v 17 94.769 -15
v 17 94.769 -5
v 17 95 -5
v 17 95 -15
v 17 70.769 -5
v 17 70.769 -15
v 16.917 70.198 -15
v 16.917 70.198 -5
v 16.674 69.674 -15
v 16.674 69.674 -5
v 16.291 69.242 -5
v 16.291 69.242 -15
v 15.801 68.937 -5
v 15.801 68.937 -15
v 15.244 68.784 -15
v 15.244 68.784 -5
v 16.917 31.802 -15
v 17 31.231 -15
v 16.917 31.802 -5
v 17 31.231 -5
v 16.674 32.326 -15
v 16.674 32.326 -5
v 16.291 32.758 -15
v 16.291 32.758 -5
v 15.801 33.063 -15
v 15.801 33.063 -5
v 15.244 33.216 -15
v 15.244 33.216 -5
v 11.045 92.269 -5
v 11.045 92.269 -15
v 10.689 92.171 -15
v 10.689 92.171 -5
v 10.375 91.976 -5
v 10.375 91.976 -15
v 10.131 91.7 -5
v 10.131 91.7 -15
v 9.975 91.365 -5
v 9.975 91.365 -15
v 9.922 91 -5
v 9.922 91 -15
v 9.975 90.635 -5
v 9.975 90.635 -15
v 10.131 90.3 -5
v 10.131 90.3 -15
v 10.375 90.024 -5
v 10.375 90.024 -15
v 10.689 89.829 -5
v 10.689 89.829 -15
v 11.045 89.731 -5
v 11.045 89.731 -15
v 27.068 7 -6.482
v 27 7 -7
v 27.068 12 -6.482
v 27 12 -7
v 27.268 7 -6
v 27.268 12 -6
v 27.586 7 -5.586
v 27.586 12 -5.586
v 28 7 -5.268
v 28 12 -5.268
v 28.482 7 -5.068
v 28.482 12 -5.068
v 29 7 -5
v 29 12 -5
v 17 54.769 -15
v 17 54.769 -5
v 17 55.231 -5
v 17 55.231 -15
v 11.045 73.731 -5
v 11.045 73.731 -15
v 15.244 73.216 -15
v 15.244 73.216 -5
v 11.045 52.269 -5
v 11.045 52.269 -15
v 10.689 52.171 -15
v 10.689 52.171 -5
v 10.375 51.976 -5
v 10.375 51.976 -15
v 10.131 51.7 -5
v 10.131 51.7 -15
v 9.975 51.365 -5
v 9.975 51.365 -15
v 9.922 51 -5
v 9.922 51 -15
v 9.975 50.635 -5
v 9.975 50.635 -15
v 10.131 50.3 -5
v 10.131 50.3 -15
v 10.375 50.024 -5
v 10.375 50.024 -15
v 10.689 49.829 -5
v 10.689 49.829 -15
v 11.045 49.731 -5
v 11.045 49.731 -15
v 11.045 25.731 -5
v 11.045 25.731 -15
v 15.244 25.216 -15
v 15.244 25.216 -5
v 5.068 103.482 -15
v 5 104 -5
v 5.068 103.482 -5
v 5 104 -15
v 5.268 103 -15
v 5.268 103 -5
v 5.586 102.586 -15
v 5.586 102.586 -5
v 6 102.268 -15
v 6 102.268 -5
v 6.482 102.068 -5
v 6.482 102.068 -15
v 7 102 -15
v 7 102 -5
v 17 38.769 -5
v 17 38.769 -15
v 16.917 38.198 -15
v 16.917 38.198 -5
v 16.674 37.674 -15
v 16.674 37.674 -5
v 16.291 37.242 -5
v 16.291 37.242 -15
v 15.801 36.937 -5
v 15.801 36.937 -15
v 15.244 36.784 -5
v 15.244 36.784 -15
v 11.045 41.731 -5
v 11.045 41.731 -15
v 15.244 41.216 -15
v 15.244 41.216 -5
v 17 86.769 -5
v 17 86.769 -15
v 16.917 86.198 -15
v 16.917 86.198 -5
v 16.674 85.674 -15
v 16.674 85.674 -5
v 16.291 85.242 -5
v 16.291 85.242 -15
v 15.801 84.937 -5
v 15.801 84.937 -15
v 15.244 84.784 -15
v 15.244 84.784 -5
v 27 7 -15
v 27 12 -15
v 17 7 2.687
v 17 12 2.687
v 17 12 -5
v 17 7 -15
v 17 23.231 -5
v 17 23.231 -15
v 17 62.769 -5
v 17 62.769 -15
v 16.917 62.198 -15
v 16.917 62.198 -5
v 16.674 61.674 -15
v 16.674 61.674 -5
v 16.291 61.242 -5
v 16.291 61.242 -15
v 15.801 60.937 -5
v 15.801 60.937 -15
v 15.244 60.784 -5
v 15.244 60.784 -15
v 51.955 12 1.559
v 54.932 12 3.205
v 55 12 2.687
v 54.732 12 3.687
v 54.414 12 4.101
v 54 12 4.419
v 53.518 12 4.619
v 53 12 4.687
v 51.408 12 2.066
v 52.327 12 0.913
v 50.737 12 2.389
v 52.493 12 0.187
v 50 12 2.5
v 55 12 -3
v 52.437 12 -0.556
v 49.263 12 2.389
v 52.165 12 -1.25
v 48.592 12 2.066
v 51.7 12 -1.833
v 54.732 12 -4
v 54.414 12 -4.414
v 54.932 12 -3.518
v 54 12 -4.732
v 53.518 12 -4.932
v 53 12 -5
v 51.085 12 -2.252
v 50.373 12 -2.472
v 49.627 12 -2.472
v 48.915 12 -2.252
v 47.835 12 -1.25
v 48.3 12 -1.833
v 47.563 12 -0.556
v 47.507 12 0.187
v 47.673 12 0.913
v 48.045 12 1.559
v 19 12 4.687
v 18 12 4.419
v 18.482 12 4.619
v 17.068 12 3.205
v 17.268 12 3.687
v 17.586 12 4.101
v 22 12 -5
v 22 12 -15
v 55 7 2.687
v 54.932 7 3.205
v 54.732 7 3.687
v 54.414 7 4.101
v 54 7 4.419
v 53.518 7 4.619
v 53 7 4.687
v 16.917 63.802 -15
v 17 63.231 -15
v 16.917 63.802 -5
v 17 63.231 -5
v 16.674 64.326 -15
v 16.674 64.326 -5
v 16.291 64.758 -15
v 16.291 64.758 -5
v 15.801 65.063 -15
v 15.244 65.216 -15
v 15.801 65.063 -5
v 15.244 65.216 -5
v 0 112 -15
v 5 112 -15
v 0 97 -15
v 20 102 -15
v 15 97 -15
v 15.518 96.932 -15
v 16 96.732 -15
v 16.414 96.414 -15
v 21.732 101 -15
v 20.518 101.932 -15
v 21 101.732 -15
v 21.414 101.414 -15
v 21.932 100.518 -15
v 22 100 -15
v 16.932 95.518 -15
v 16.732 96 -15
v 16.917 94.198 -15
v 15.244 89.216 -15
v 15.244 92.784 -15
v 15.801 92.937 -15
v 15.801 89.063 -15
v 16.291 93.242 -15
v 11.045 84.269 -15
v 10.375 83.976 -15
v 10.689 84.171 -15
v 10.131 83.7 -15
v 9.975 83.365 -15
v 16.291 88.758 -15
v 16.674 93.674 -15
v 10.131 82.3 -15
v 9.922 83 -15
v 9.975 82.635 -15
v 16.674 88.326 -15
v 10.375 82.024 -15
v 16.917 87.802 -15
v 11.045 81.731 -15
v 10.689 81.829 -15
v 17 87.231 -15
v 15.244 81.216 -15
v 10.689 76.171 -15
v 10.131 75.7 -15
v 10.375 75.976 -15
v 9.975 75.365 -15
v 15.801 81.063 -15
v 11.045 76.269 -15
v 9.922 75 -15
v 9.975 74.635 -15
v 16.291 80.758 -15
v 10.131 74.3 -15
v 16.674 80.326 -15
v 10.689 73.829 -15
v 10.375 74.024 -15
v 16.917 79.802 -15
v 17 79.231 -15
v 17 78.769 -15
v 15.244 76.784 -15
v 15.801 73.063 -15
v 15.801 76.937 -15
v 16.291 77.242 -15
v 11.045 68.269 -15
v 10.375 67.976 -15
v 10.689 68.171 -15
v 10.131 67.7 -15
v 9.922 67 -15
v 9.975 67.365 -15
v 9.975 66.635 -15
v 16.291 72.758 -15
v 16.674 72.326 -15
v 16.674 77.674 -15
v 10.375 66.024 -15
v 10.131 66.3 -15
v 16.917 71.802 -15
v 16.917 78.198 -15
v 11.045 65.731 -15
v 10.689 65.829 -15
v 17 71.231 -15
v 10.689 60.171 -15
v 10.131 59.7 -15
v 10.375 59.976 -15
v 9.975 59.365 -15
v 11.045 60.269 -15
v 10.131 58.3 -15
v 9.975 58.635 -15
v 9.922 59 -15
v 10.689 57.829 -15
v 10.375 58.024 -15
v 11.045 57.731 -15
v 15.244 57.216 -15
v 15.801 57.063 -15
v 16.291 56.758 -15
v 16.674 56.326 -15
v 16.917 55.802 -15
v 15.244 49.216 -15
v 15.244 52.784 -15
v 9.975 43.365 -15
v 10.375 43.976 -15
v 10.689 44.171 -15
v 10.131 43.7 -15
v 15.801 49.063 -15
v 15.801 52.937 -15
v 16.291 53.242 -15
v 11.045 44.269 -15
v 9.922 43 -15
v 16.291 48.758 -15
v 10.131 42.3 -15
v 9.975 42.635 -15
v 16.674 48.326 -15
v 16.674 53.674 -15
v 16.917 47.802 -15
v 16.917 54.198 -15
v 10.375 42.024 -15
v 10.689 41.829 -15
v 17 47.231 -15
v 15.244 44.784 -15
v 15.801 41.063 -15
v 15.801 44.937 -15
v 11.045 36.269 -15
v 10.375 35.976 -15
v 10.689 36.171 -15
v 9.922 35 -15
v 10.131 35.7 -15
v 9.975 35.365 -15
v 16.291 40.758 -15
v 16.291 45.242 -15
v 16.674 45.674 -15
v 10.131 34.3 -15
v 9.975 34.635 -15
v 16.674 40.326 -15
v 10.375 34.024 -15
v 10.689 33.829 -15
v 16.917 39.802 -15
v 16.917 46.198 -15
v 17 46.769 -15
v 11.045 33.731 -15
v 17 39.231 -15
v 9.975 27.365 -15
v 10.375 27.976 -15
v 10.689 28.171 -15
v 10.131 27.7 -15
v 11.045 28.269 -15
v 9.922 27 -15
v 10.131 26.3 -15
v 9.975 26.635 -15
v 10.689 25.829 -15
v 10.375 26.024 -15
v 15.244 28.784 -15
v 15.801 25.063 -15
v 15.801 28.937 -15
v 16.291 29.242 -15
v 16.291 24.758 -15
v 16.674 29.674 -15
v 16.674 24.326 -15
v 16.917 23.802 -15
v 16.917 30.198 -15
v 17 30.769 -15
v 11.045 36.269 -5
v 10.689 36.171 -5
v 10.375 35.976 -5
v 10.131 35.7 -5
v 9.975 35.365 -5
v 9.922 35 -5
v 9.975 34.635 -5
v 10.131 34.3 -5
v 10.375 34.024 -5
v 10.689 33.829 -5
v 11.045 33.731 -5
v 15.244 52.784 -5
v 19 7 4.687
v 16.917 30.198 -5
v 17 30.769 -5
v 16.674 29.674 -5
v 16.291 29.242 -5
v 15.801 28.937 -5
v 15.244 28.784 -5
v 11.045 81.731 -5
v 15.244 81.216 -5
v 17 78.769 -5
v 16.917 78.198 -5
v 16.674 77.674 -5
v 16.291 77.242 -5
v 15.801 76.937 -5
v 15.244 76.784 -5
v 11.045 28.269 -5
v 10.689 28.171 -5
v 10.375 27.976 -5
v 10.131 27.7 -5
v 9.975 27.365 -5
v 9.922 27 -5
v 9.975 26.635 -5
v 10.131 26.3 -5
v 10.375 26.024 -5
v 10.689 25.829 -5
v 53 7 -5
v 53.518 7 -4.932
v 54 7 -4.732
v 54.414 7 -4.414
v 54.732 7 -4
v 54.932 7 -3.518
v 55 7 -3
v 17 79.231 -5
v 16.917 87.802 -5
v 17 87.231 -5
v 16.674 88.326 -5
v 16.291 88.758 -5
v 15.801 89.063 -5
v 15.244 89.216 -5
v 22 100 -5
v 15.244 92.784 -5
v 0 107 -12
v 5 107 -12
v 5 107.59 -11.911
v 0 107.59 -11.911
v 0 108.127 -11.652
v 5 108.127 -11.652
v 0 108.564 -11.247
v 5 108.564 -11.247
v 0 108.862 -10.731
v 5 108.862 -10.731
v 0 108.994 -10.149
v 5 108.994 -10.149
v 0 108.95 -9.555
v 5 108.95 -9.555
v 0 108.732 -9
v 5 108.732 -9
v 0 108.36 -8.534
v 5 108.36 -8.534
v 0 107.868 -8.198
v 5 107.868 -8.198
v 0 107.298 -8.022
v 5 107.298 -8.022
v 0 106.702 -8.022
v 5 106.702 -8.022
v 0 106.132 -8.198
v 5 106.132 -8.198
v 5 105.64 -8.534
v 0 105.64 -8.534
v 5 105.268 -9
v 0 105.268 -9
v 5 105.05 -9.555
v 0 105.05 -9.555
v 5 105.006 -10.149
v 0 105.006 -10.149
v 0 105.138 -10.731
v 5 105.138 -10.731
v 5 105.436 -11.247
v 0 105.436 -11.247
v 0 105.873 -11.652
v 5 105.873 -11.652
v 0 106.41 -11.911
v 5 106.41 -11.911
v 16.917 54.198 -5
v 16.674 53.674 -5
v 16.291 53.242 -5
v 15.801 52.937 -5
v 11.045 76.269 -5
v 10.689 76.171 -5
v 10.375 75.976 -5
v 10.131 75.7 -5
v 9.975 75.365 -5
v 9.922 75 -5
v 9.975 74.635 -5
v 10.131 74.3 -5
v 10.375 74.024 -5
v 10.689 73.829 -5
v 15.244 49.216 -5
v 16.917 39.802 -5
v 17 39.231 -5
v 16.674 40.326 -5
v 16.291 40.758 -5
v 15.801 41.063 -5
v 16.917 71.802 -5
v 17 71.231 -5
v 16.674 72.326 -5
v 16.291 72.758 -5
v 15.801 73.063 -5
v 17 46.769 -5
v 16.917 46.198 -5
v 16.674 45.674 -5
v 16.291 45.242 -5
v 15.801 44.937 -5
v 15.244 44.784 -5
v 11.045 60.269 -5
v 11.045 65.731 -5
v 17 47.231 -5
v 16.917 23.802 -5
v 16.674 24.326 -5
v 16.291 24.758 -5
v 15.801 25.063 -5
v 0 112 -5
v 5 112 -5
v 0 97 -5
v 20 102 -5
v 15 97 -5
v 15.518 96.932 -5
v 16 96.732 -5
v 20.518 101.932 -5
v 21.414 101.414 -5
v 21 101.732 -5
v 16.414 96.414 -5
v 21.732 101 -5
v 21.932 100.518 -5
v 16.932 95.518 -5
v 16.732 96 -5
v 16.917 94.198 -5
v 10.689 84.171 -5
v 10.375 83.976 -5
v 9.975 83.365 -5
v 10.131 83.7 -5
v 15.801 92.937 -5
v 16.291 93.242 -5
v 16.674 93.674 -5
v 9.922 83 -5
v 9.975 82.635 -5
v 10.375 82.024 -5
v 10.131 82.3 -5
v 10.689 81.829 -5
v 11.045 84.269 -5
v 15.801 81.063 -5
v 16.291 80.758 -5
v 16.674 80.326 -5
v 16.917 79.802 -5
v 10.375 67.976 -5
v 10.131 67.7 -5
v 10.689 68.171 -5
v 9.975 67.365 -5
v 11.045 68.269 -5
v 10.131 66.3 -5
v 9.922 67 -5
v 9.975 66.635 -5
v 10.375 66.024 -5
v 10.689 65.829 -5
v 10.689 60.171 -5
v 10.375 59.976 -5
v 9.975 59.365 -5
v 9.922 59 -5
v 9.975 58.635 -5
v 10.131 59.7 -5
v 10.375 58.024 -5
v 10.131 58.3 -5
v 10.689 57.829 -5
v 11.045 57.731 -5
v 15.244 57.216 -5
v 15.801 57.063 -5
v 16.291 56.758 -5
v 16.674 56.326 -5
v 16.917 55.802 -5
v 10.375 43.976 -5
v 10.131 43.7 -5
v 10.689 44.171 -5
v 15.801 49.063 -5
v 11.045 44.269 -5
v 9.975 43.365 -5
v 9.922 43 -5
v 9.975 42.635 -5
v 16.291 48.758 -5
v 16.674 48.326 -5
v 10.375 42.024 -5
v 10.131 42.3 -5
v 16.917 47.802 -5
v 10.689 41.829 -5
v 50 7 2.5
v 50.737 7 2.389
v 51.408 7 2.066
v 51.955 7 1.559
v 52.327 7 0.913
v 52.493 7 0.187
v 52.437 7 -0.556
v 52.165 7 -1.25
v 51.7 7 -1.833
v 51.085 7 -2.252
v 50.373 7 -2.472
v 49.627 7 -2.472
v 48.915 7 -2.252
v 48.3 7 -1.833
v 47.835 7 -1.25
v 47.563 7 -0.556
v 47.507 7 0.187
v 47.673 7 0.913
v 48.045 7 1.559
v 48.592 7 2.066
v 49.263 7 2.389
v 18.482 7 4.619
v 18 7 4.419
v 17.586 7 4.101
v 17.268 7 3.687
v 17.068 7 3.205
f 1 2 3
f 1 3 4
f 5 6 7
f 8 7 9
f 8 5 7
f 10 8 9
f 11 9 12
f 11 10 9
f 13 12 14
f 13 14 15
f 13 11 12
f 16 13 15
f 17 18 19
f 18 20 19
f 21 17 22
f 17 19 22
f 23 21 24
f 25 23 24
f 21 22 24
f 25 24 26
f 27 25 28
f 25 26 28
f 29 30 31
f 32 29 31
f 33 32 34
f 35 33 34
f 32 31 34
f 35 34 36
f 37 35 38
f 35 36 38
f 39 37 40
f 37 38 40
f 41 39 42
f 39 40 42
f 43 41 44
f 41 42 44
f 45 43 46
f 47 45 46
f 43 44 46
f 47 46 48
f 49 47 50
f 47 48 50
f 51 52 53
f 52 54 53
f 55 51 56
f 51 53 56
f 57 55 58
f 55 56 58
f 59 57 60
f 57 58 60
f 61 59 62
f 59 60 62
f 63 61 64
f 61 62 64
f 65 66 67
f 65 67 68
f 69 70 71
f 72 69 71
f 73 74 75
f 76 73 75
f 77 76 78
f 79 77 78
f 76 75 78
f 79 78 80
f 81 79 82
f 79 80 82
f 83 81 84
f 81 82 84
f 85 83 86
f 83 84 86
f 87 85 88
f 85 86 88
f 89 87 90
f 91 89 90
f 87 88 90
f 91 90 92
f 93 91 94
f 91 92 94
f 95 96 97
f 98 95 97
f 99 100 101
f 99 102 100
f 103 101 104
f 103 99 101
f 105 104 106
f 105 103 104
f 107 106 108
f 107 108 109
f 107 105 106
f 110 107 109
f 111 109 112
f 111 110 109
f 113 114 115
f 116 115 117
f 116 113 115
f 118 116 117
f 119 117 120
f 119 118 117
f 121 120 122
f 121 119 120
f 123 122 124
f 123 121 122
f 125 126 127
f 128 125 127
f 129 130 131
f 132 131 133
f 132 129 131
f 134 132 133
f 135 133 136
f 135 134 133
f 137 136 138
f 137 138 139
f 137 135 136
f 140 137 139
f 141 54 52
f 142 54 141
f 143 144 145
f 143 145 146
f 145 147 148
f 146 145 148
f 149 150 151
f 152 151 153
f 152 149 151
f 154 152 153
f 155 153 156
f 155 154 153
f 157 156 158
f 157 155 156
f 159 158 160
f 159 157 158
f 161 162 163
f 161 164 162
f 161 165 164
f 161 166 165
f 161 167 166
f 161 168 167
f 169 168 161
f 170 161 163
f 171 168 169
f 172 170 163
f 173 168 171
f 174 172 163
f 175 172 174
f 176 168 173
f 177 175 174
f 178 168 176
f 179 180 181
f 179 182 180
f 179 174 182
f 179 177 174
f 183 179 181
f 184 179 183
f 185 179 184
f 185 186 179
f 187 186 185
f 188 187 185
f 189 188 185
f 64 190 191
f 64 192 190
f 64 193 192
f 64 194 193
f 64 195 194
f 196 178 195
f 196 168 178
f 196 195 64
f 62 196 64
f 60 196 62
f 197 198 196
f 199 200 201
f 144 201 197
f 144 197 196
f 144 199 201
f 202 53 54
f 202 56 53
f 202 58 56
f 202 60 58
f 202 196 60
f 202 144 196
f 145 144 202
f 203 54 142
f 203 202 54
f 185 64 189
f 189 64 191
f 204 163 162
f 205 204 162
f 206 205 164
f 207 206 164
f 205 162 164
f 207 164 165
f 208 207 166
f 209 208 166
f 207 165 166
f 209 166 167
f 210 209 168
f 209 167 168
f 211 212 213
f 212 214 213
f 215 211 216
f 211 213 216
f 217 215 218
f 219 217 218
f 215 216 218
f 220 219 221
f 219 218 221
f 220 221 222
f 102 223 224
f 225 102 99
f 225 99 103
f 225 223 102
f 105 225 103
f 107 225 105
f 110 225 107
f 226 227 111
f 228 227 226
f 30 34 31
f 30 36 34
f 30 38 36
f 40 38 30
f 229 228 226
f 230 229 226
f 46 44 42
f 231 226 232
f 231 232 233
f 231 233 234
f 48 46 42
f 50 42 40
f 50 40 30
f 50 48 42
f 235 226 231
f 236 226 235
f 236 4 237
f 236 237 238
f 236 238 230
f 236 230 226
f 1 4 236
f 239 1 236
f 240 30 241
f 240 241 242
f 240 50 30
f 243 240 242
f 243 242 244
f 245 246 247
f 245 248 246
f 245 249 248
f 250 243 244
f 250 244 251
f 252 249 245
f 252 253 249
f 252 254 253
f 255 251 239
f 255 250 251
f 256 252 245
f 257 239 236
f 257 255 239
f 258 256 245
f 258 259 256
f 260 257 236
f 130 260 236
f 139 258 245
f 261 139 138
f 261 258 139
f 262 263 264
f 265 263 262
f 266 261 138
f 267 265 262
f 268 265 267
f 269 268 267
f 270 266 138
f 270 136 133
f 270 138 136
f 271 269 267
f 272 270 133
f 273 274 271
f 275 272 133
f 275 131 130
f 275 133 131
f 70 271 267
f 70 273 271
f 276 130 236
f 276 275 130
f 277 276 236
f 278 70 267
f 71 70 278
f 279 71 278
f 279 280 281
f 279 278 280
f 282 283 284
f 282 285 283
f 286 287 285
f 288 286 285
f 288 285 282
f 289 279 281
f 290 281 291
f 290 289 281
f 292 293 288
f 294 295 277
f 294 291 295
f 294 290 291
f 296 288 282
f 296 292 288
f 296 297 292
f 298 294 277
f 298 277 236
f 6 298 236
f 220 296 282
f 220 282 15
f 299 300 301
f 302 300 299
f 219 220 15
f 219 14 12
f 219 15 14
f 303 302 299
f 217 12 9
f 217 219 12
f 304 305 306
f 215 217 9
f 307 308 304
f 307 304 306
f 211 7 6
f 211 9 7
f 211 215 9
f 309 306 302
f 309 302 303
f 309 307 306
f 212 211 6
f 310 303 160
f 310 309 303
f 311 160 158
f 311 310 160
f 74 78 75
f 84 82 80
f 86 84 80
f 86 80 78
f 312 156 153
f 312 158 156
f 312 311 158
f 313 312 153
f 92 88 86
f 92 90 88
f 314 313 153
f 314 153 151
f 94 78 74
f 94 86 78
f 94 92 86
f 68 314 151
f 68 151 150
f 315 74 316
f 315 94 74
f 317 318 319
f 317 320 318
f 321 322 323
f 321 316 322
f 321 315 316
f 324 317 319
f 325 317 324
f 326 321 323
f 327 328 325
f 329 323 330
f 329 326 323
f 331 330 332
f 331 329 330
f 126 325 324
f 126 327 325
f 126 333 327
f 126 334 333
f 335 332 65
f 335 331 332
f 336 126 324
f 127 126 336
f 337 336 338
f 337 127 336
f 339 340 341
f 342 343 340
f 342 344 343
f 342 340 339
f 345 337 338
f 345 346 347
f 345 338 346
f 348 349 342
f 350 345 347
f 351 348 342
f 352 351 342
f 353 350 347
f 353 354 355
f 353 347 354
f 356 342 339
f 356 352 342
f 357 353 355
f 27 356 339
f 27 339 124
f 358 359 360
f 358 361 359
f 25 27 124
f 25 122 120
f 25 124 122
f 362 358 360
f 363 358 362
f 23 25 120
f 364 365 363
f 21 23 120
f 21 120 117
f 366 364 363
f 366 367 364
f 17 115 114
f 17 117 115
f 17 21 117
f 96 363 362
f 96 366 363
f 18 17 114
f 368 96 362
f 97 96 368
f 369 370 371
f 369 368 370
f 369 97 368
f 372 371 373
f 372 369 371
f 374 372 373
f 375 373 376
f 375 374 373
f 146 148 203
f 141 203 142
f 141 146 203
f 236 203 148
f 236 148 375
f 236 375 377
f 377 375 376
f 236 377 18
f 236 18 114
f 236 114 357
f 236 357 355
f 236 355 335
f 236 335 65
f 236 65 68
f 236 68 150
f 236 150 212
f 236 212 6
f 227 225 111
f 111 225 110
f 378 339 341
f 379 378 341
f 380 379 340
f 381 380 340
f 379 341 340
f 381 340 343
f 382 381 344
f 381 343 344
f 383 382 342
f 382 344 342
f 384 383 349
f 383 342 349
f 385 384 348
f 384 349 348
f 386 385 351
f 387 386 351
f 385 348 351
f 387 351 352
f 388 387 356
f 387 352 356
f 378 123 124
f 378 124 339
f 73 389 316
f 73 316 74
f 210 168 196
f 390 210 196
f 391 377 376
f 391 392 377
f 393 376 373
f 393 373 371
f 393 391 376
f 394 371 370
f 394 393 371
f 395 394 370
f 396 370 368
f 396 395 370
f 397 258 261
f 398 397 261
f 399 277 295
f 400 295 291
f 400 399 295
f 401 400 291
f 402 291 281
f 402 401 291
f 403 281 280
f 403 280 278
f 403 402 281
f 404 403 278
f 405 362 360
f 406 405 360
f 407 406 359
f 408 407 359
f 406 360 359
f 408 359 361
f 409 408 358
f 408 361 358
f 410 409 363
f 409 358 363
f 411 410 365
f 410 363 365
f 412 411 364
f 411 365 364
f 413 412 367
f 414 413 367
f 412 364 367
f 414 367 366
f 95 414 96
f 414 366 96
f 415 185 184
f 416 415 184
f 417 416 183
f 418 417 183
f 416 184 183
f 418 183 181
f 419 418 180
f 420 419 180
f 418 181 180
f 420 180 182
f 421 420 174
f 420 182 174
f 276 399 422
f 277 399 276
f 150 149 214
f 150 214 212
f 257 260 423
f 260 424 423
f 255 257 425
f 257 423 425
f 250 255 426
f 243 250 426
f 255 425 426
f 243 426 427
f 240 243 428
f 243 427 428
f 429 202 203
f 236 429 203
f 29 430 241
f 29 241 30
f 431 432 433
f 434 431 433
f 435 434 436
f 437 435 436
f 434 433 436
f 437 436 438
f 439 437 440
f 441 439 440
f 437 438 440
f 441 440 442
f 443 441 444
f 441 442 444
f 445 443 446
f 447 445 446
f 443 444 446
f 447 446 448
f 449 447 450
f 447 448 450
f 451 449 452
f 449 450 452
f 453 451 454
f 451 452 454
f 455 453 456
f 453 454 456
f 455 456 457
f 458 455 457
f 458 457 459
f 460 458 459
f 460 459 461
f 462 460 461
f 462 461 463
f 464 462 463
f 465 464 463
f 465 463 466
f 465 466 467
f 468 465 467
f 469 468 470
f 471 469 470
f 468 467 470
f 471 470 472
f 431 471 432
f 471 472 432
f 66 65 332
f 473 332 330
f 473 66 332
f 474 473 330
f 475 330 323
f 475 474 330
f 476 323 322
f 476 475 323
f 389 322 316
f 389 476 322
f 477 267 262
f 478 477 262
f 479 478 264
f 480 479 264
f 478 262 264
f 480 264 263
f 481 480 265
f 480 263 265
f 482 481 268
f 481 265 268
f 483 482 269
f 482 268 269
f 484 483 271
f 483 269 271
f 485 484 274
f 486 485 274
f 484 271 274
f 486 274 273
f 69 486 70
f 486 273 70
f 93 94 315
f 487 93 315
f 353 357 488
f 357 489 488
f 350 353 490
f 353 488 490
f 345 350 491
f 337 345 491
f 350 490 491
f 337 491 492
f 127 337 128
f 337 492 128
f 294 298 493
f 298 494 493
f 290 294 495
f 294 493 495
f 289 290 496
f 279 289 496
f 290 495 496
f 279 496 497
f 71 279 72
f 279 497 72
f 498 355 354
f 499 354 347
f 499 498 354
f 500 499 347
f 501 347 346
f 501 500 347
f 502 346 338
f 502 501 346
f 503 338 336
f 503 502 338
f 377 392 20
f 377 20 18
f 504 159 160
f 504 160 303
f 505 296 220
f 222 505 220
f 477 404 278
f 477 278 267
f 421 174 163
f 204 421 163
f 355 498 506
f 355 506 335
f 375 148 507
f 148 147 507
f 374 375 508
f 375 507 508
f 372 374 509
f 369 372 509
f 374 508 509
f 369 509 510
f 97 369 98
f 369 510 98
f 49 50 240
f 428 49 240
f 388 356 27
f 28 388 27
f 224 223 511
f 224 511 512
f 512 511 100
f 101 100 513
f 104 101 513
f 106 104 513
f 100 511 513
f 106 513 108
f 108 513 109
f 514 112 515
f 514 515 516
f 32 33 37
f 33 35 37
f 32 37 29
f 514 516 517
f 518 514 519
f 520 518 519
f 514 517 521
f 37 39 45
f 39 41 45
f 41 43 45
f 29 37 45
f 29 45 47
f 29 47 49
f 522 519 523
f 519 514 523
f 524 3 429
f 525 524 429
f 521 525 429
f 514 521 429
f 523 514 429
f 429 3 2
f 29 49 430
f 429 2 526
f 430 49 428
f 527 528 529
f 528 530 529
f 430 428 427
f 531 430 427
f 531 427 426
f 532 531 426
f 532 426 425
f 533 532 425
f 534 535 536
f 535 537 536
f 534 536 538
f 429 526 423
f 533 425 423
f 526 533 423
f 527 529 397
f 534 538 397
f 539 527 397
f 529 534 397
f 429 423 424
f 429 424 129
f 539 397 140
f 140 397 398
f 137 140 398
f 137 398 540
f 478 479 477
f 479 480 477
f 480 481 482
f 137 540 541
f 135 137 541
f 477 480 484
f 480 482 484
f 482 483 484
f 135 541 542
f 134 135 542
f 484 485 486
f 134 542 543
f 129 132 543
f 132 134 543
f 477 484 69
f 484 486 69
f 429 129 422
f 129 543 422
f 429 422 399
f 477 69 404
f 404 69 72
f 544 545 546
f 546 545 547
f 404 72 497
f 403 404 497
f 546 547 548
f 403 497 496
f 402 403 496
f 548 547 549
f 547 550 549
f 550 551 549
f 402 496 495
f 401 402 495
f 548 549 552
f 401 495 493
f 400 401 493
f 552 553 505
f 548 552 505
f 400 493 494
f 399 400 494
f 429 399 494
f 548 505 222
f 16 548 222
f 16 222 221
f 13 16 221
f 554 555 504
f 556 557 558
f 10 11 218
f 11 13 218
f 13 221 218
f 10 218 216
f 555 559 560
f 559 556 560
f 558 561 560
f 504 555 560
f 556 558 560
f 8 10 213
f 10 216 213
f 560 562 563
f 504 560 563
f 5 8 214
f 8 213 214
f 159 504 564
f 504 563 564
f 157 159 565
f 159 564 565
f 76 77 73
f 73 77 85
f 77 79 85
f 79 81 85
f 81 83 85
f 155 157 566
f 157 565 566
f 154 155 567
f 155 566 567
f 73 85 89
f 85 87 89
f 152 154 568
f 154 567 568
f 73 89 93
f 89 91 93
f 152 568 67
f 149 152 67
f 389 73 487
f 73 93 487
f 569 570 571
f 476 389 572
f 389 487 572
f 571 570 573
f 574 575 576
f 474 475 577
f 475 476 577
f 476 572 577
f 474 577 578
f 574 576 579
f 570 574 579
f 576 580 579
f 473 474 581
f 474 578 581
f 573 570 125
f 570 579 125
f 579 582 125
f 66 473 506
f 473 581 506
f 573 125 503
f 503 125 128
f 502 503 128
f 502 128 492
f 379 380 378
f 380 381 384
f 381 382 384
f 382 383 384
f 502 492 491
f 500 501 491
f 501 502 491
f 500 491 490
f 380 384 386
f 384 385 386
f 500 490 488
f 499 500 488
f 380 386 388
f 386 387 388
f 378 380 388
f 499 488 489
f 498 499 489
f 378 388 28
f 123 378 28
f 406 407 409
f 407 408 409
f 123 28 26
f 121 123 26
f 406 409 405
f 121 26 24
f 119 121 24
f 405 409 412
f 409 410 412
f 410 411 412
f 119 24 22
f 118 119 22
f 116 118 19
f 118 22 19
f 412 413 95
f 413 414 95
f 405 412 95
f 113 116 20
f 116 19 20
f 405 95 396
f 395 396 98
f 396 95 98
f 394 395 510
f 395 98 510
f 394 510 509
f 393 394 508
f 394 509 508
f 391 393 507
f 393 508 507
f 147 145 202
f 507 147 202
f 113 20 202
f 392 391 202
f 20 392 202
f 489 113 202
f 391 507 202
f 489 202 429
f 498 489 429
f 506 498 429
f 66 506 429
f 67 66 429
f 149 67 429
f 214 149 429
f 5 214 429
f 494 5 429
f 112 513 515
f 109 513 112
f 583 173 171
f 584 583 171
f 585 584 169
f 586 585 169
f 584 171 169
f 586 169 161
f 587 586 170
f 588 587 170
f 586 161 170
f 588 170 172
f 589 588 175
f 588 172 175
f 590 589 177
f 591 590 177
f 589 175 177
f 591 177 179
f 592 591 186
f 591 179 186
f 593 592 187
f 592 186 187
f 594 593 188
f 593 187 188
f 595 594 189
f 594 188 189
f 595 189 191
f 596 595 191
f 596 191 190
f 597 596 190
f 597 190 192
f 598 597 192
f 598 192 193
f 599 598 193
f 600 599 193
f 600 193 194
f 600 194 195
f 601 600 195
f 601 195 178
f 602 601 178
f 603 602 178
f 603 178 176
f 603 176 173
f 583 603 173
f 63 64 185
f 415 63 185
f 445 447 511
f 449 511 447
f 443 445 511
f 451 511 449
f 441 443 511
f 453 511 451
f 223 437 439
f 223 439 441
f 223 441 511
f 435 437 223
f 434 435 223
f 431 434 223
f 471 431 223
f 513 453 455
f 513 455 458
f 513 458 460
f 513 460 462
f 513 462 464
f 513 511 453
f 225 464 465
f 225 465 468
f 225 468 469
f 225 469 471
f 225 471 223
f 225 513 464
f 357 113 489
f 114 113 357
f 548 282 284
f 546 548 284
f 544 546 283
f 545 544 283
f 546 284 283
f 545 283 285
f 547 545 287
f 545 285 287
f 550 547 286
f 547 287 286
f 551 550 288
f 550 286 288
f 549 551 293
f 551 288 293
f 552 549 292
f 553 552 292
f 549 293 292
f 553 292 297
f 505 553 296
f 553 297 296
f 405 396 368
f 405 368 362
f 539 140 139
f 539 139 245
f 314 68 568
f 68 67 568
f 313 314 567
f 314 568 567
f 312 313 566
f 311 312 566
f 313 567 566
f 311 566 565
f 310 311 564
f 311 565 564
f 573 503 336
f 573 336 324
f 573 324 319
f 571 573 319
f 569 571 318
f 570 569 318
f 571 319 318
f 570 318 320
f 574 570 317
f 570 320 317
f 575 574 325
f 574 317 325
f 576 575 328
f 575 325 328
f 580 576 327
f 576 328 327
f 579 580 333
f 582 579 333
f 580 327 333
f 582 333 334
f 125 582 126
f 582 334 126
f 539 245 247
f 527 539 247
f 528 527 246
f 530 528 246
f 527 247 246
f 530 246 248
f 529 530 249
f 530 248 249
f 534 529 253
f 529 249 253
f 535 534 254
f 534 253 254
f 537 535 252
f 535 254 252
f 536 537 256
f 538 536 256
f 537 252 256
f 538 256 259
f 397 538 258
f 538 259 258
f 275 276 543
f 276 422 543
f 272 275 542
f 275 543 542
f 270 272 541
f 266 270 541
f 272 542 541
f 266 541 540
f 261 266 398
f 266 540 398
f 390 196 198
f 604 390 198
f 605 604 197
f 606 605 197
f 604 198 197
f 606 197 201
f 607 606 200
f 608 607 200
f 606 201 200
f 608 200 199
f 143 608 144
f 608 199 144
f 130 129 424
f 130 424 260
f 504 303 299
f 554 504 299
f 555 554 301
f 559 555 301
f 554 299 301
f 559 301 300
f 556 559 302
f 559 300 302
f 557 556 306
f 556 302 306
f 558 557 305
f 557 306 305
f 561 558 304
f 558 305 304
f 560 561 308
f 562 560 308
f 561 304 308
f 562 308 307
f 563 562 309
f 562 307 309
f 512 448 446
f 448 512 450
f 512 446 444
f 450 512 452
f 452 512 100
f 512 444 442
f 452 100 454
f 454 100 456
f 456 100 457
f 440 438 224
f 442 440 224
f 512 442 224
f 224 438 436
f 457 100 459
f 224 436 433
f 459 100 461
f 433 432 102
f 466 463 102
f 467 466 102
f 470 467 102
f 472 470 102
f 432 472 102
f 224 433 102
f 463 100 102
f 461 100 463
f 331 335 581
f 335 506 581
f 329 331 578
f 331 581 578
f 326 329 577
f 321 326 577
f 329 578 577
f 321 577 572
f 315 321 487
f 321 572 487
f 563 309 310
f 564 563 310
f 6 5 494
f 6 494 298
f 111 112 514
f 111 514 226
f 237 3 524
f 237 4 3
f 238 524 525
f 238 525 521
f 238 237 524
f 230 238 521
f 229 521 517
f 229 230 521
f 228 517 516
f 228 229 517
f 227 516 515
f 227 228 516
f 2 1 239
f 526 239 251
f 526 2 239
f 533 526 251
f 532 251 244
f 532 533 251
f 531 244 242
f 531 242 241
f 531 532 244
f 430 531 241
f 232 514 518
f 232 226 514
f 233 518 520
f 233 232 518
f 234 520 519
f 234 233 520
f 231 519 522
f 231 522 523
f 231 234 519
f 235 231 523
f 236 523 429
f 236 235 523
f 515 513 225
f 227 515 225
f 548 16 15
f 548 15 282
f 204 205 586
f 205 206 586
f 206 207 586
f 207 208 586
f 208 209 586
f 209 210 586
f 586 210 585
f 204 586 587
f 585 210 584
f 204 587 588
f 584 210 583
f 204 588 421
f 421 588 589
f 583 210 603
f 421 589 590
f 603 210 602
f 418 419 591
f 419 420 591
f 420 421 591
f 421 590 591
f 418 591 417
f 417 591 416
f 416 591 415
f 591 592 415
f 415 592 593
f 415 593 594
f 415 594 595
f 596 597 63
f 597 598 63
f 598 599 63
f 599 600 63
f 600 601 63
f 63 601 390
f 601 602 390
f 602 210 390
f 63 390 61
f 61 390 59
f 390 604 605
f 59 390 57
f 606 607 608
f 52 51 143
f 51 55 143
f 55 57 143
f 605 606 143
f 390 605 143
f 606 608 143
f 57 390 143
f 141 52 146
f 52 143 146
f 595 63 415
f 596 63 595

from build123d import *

# Parameters (mm, degrees)
BOSS_EXTRUDE1_DEPTH    = 7
SKETCH2_W              = 5
SKETCH2_H              = 10
BOSS_EXTRUDE2_DEPTH    = 95
SKETCH15_R             = 3.5
CUT_EXTRUDE3_DEPTH     = 7
SKETCH18_W             = 10
SKETCH18_H             = 5
BOSS_EXTRUDE3_DEPTH    = 34
BOSS_EXTRUDE4_DEPTH    = 10
FILLET1_R              = 2
FILLET2_R              = 2
LPATTERN2_COUNT        = 9
LPATTERN2_PITCH        = 8
FILLET1_OF_LPATTERN2_R = 2
SKETCH20_R             = 2.5
CUT_EXTRUDE4_DEPTH     = 10
CIRPATTERN2_COUNT      = 4
SKETCH22_W             = 135.679550384
SKETCH22_H             = 112.96527187
CUT_EXTRUDE5_DEPTH     = 61.740758688
BOSS_EXTRUDE5_START    = 5
SKETCH23_R             = 2.5
BOSS_EXTRUDE5_DEPTH    = 5
CUT_EXTRUDE6_START     = -10
CUT_EXTRUDE6_DEPTH     = 10
SKETCH27_W             = 10
SKETCH27_H             = 5
BOSS_EXTRUDE6_DEPTH    = 5
SKETCH28_W             = 5
SKETCH28_H             = 10
BOSS_EXTRUDE7_DEPTH    = 10
SKETCH29_R             = 2
CUT_EXTRUDE7_DEPTH     = 5
FILLET3_R              = 2


with BuildPart() as part:
    # Sketch1 → Boss-Extrude1 (new body)
    with BuildSketch(Plane(origin=(0, 0, 0), x_dir=(1, 0, 0), z_dir=(0, 1, 0))):
        with BuildLine():
            Line((-8, 56.940758688), (-8, 59.740758688))
            ThreePointArc((-8, 59.740758688), (-7.414213562, 61.154972251), (-6, 61.740758688))
            Line((-6, 61.740758688), (6, 61.740758688))
            ThreePointArc((6, 61.740758688), (7.414213562, 61.154972251), (8, 59.740758688))
            Line((8, 59.740758688), (8, 56.940758688))
            ThreePointArc((8, 56.940758688), (22.004297361, 53.123073119), (34.606342345, 45.920050844))
            Line((34.606342345, 45.920050844), (36.586241332, 47.899949831))
            ThreePointArc((36.586241332, 47.899949831), (38.000454895, 48.485736269), (39.414668457, 47.899949831))
            Line((39.414668457, 47.899949831), (47.899949831, 39.414668457))
            ThreePointArc((47.899949831, 39.414668457), (48.485736269, 38.000454895), (47.899949831, 36.586241332))
            Line((47.899949831, 36.586241332), (45.920050844, 34.606342345))
            ThreePointArc((45.920050844, 34.606342345), (53.123073119, 22.004297361), (56.940758688, 8))
            Line((56.940758688, 8), (59.740758688, 8))
            ThreePointArc((59.740758688, 8), (61.154972251, 7.414213562), (61.740758688, 6))
            Line((61.740758688, 6), (61.740758688, -6))
            ThreePointArc((61.740758688, -6), (61.154972251, -7.414213562), (59.740758688, -8))
            Line((59.740758688, -8), (56.940758688, -8))
            ThreePointArc((56.940758688, -8), (53.123073119, -22.004297361), (45.920050844, -34.606342345))
            Line((45.920050844, -34.606342345), (47.899949831, -36.586241332))
            ThreePointArc((47.899949831, -36.586241332), (48.485736269, -38.000454895), (47.899949831, -39.414668457))
            Line((47.899949831, -39.414668457), (39.414668457, -47.899949831))
            ThreePointArc((39.414668457, -47.899949831), (38.000454895, -48.485736269), (36.586241332, -47.899949831))
            Line((36.586241332, -47.899949831), (34.606342345, -45.920050844))
            ThreePointArc((34.606342345, -45.920050844), (22.004297361, -53.123073119), (8, -56.940758688))
            Line((8, -56.940758688), (8, -59.740758688))
            ThreePointArc((8, -59.740758688), (7.414213562, -61.154972251), (6, -61.740758688))
            Line((6, -61.740758688), (-6, -61.740758688))
            ThreePointArc((-6, -61.740758688), (-7.414213562, -61.154972251), (-8, -59.740758688))
            Line((-8, -59.740758688), (-8, -56.940758688))
            ThreePointArc((-8, -56.940758688), (-22.004297361, -53.123073119), (-34.606342345, -45.920050844))
            Line((-34.606342345, -45.920050844), (-36.586241332, -47.899949831))
            ThreePointArc((-36.586241332, -47.899949831), (-38.000454895, -48.485736269), (-39.414668457, -47.899949831))
            Line((-39.414668457, -47.899949831), (-47.899949831, -39.414668457))
            ThreePointArc((-47.899949831, -39.414668457), (-48.485736269, -38.000454895), (-47.899949831, -36.586241332))
            Line((-47.899949831, -36.586241332), (-45.920050844, -34.606342345))
            ThreePointArc((-45.920050844, -34.606342345), (-53.123073119, -22.004297361), (-56.940758688, -8))
            Line((-56.940758688, -8), (-59.740758688, -8))
            ThreePointArc((-59.740758688, -8), (-61.154972251, -7.414213562), (-61.740758688, -6))
            Line((-61.740758688, -6), (-61.740758688, 6))
            ThreePointArc((-61.740758688, 6), (-61.154972251, 7.414213562), (-59.740758688, 8))
            Line((-59.740758688, 8), (-56.940758688, 8))
            ThreePointArc((-56.940758688, 8), (-53.123073119, 22.004297361), (-45.920050844, 34.606342345))
            Line((-45.920050844, 34.606342345), (-47.899949831, 36.586241332))
            ThreePointArc((-47.899949831, 36.586241332), (-48.485736269, 38.000454895), (-47.899949831, 39.414668457))
            Line((-47.899949831, 39.414668457), (-39.414668457, 47.899949831))
            ThreePointArc((-39.414668457, 47.899949831), (-38.000454895, 48.485736269), (-36.586241332, 47.899949831))
            Line((-36.586241332, 47.899949831), (-34.606342345, 45.920050844))
            ThreePointArc((-34.606342345, 45.920050844), (-22.004297361, 53.123073119), (-8, 56.940758688))
        make_face()
    extrude(amount=BOSS_EXTRUDE1_DEPTH)

    # Sketch2 → Boss-Extrude2 (add)
    with BuildSketch(Plane(origin=(0, 7, 0), x_dir=(1, 0, 0), z_dir=(0, 1, 0))):
        with Locations((19.5, 10)):
            Rectangle(SKETCH2_W, SKETCH2_H)
        with Locations((-19.5, 10)):
            Rectangle(SKETCH2_W, SKETCH2_H)
    extrude(amount=BOSS_EXTRUDE2_DEPTH)

    # Sketch15 → Cut-Extrude3 (cut)
    with BuildSketch(Plane.XZ):
        with Locations(Location((0, 0, 0), (0, 0, 270))):
            Circle(SKETCH15_R)
    extrude(amount=-CUT_EXTRUDE3_DEPTH, mode=Mode.SUBTRACT)

    # Sketch18 → Boss-Extrude3 (add)
    with BuildSketch(Plane(origin=(-17, 0, 0), x_dir=(0, 0, -1), z_dir=(1, 0, 0))):
        with Locations((10, 99.5)):
            Rectangle(SKETCH18_W, SKETCH18_H)
    extrude(amount=BOSS_EXTRUDE3_DEPTH)

    # Sketch19 → Boss-Extrude4 (add)
    with BuildSketch(Plane(origin=(0, 0, -15), x_dir=(-1, 0, 0), z_dir=(0, 0, -1))):
        with BuildLine():
            Line((-17, 93), (-11.04472309, 92.26878394))
            ThreePointArc((-11.04472309, 92.26878394), (-9.922197884, 91), (-11.04472309, 89.73121606))
            Line((-11.04472309, 89.73121606), (-17, 89))
            Line((-17, 89), (-17, 93))
        make_face()
    boss_extrude4 = extrude(amount=-BOSS_EXTRUDE4_DEPTH)

    # Fillet1
    fillet1_edges = [part.edges().sort_by_distance(p)[0] for p in [
        (17, 89, -10),
        (17, 93, -10),
    ]]
    fillet(fillet1_edges, radius=FILLET1_R)

    # Fillet2
    fillet2_edges = [part.edges().sort_by_distance(p)[0] for p in [
        (22, 102, -10),
        (-22, 102, -10),
        (-17, 97, -10),
        (17, 97, -10),
    ]]
    fillet(fillet2_edges, radius=FILLET2_R)

    # LPattern2: Boss-Extrude4 ×9
    with Locations(*[(0, -i * LPATTERN2_PITCH, 0) for i in range(1, LPATTERN2_COUNT)]):
        add(boss_extrude4)

    # Fillet1 of LPattern2
    fillet1_of_lpattern2_edges = [part.edges().sort_by_distance(p)[0] for p in [
        (17, 81, -10),
        (17, 85, -10),
        (17, 73, -10),
        (17, 77, -10),
        (17, 65, -10),
        (17, 69, -10),
        (17, 57, -10),
        (17, 61, -10),
        (17, 49, -10),
        (17, 53, -10),
        (17, 41, -10),
        (17, 45, -10),
        (17, 33, -10),
        (17, 37, -10),
        (17, 25, -10),
        (17, 29, -10),
    ]]
    fillet(fillet1_of_lpattern2_edges, radius=FILLET1_OF_LPATTERN2_R)

    # Sketch20 → Cut-Extrude4 (cut)
    with BuildSketch(Plane(origin=(0, 7, 0), x_dir=(1, 0, 0), z_dir=(0, 1, 0))):
        with Locations(Location((0, 50, 0), (0, 0, 270))):
            Circle(SKETCH20_R)
    cut_extrude4 = extrude(amount=-CUT_EXTRUDE4_DEPTH, mode=Mode.SUBTRACT)

    # CirPattern2: Cut-Extrude4 ×4 about axis
    cirpattern2_axis = Axis((0, 0, 0), (0, 1, 0))
    for i in range(1, CIRPATTERN2_COUNT):
        add(cut_extrude4.rotate(cirpattern2_axis, i * 360 / CIRPATTERN2_COUNT), mode=Mode.SUBTRACT)

    # Sketch22 → Cut-Extrude5 (cut)
    with BuildSketch(Plane(origin=(0, 0, 0), x_dir=(0, 0, -1), z_dir=(1, 0, 0))):
        with Locations((-0.132373771, 50.371775874)):
            Rectangle(SKETCH22_W, SKETCH22_H)
    extrude(amount=-CUT_EXTRUDE5_DEPTH, mode=Mode.SUBTRACT)

    # Sketch23 → Boss-Extrude5 (add)
    with BuildSketch(Plane(origin=(0, 7, 0), x_dir=(1, 0, 0), z_dir=(0, 1, 0)).offset(BOSS_EXTRUDE5_START)):
        with BuildLine():
            Line((55, 3), (55, -2.687123684))
            ThreePointArc((55, -2.687123684), (54.414213562, -4.101337246), (53, -4.687123684))
            Line((53, -4.687123684), (19, -4.687123684))
            ThreePointArc((19, -4.687123684), (17.585786438, -4.101337246), (17, -2.687123684))
            Line((17, -2.687123684), (17, 5))
            Line((17, 5), (53, 5))
            ThreePointArc((53, 5), (54.414213562, 4.414213562), (55, 3))
        make_face()
        with Locations(Location((50, 0, 0), (0, 0, 270))):
            Circle(SKETCH23_R, mode=Mode.SUBTRACT)
    extrude(amount=-BOSS_EXTRUDE5_DEPTH)

    # Sketch26 → Cut-Extrude6 (cut)
    with BuildSketch(Plane(origin=(0, 7, 0), x_dir=(1, 0, 0), z_dir=(0, 1, 0)).offset(CUT_EXTRUDE6_START)):
        with BuildLine():
            Line((6, 61.740758688), (0, 61.740758688))
            Line((0, 61.740758688), (0, 52.5))
            ThreePointArc((0, 52.5), (2.5, 50), (0, 47.5))
            Line((0, 47.5), (0, 3.5))
            ThreePointArc((0, 3.5), (3.5, 0), (0, -3.5))
            Line((0, -3.5), (0, -47.5))
            ThreePointArc((0, -47.5), (2.5, -50), (0, -52.5))
            Line((0, -52.5), (0, -61.740758688))
            Line((0, -61.740758688), (6, -61.740758688))
            ThreePointArc((6, -61.740758688), (7.414213562, -61.154972251), (8, -59.740758688))
            Line((8, -59.740758688), (8, -56.940758688))
            ThreePointArc((8, -56.940758688), (22.004297361, -53.123073119), (34.606342345, -45.920050844))
            Line((34.606342345, -45.920050844), (36.586241332, -47.899949831))
            ThreePointArc((36.586241332, -47.899949831), (38.000454895, -48.485736269), (39.414668457, -47.899949831))
            Line((39.414668457, -47.899949831), (47.899949831, -39.414668457))
            ThreePointArc((47.899949831, -39.414668457), (48.485736269, -38.000454895), (47.899949831, -36.586241332))
            Line((47.899949831, -36.586241332), (45.920050844, -34.606342345))
            ThreePointArc((45.920050844, -34.606342345), (53.123073119, -22.004297361), (56.940758688, -8))
            Line((56.940758688, -8), (59.740758688, -8))
            ThreePointArc((59.740758688, -8), (61.154972251, -7.414213562), (61.740758688, -6))
            Line((61.740758688, -6), (61.740758688, 6))
            ThreePointArc((61.740758688, 6), (61.154972251, 7.414213562), (59.740758688, 8))
            Line((59.740758688, 8), (56.940758688, 8))
            ThreePointArc((56.940758688, 8), (53.123073119, 22.004297361), (45.920050844, 34.606342345))
            Line((45.920050844, 34.606342345), (47.899949831, 36.586241332))
            ThreePointArc((47.899949831, 36.586241332), (48.485736269, 38.000454895), (47.899949831, 39.414668457))
            Line((47.899949831, 39.414668457), (39.414668457, 47.899949831))
            ThreePointArc((39.414668457, 47.899949831), (38.000454895, 48.485736269), (36.586241332, 47.899949831))
            Line((36.586241332, 47.899949831), (34.606342345, 45.920050844))
            ThreePointArc((34.606342345, 45.920050844), (22.004297361, 53.123073119), (8, 56.940758688))
            Line((8, 56.940758688), (8, 59.740758688))
            ThreePointArc((8, 59.740758688), (7.414213562, 61.154972251), (6, 61.740758688))
        make_face()
    extrude(amount=CUT_EXTRUDE6_DEPTH, mode=Mode.SUBTRACT)

    # Sketch27 → Boss-Extrude6 (add)
    with BuildSketch(Plane(origin=(22, 0, 0), x_dir=(0, 0, -1), z_dir=(1, 0, 0))):
        with Locations((10, 9.5)):
            Rectangle(SKETCH27_W, SKETCH27_H)
    extrude(amount=BOSS_EXTRUDE6_DEPTH)

    # Sketch28 → Boss-Extrude7 (add)
    with BuildSketch(Plane(origin=(0, 102, 0), x_dir=(1, 0, 0), z_dir=(0, 1, 0))):
        with Locations((2.5, 10)):
            Rectangle(SKETCH28_W, SKETCH28_H)
    extrude(amount=BOSS_EXTRUDE7_DEPTH)

    # Sketch29 → Cut-Extrude7 (cut)
    with BuildSketch(Plane(origin=(5, 0, 0), x_dir=(0, 0, -1), z_dir=(1, 0, 0))):
        with Locations((10, 107)):
            Circle(SKETCH29_R)
    extrude(amount=-CUT_EXTRUDE7_DEPTH, mode=Mode.SUBTRACT)

    # Fillet3
    fillet3_edges = [part.edges().sort_by_distance(p)[0] for p in [
        (27, 9.5, -5),
        (5, 102, -10),
    ]]
    fillet(fillet3_edges, radius=FILLET3_R)


solid = part.part
